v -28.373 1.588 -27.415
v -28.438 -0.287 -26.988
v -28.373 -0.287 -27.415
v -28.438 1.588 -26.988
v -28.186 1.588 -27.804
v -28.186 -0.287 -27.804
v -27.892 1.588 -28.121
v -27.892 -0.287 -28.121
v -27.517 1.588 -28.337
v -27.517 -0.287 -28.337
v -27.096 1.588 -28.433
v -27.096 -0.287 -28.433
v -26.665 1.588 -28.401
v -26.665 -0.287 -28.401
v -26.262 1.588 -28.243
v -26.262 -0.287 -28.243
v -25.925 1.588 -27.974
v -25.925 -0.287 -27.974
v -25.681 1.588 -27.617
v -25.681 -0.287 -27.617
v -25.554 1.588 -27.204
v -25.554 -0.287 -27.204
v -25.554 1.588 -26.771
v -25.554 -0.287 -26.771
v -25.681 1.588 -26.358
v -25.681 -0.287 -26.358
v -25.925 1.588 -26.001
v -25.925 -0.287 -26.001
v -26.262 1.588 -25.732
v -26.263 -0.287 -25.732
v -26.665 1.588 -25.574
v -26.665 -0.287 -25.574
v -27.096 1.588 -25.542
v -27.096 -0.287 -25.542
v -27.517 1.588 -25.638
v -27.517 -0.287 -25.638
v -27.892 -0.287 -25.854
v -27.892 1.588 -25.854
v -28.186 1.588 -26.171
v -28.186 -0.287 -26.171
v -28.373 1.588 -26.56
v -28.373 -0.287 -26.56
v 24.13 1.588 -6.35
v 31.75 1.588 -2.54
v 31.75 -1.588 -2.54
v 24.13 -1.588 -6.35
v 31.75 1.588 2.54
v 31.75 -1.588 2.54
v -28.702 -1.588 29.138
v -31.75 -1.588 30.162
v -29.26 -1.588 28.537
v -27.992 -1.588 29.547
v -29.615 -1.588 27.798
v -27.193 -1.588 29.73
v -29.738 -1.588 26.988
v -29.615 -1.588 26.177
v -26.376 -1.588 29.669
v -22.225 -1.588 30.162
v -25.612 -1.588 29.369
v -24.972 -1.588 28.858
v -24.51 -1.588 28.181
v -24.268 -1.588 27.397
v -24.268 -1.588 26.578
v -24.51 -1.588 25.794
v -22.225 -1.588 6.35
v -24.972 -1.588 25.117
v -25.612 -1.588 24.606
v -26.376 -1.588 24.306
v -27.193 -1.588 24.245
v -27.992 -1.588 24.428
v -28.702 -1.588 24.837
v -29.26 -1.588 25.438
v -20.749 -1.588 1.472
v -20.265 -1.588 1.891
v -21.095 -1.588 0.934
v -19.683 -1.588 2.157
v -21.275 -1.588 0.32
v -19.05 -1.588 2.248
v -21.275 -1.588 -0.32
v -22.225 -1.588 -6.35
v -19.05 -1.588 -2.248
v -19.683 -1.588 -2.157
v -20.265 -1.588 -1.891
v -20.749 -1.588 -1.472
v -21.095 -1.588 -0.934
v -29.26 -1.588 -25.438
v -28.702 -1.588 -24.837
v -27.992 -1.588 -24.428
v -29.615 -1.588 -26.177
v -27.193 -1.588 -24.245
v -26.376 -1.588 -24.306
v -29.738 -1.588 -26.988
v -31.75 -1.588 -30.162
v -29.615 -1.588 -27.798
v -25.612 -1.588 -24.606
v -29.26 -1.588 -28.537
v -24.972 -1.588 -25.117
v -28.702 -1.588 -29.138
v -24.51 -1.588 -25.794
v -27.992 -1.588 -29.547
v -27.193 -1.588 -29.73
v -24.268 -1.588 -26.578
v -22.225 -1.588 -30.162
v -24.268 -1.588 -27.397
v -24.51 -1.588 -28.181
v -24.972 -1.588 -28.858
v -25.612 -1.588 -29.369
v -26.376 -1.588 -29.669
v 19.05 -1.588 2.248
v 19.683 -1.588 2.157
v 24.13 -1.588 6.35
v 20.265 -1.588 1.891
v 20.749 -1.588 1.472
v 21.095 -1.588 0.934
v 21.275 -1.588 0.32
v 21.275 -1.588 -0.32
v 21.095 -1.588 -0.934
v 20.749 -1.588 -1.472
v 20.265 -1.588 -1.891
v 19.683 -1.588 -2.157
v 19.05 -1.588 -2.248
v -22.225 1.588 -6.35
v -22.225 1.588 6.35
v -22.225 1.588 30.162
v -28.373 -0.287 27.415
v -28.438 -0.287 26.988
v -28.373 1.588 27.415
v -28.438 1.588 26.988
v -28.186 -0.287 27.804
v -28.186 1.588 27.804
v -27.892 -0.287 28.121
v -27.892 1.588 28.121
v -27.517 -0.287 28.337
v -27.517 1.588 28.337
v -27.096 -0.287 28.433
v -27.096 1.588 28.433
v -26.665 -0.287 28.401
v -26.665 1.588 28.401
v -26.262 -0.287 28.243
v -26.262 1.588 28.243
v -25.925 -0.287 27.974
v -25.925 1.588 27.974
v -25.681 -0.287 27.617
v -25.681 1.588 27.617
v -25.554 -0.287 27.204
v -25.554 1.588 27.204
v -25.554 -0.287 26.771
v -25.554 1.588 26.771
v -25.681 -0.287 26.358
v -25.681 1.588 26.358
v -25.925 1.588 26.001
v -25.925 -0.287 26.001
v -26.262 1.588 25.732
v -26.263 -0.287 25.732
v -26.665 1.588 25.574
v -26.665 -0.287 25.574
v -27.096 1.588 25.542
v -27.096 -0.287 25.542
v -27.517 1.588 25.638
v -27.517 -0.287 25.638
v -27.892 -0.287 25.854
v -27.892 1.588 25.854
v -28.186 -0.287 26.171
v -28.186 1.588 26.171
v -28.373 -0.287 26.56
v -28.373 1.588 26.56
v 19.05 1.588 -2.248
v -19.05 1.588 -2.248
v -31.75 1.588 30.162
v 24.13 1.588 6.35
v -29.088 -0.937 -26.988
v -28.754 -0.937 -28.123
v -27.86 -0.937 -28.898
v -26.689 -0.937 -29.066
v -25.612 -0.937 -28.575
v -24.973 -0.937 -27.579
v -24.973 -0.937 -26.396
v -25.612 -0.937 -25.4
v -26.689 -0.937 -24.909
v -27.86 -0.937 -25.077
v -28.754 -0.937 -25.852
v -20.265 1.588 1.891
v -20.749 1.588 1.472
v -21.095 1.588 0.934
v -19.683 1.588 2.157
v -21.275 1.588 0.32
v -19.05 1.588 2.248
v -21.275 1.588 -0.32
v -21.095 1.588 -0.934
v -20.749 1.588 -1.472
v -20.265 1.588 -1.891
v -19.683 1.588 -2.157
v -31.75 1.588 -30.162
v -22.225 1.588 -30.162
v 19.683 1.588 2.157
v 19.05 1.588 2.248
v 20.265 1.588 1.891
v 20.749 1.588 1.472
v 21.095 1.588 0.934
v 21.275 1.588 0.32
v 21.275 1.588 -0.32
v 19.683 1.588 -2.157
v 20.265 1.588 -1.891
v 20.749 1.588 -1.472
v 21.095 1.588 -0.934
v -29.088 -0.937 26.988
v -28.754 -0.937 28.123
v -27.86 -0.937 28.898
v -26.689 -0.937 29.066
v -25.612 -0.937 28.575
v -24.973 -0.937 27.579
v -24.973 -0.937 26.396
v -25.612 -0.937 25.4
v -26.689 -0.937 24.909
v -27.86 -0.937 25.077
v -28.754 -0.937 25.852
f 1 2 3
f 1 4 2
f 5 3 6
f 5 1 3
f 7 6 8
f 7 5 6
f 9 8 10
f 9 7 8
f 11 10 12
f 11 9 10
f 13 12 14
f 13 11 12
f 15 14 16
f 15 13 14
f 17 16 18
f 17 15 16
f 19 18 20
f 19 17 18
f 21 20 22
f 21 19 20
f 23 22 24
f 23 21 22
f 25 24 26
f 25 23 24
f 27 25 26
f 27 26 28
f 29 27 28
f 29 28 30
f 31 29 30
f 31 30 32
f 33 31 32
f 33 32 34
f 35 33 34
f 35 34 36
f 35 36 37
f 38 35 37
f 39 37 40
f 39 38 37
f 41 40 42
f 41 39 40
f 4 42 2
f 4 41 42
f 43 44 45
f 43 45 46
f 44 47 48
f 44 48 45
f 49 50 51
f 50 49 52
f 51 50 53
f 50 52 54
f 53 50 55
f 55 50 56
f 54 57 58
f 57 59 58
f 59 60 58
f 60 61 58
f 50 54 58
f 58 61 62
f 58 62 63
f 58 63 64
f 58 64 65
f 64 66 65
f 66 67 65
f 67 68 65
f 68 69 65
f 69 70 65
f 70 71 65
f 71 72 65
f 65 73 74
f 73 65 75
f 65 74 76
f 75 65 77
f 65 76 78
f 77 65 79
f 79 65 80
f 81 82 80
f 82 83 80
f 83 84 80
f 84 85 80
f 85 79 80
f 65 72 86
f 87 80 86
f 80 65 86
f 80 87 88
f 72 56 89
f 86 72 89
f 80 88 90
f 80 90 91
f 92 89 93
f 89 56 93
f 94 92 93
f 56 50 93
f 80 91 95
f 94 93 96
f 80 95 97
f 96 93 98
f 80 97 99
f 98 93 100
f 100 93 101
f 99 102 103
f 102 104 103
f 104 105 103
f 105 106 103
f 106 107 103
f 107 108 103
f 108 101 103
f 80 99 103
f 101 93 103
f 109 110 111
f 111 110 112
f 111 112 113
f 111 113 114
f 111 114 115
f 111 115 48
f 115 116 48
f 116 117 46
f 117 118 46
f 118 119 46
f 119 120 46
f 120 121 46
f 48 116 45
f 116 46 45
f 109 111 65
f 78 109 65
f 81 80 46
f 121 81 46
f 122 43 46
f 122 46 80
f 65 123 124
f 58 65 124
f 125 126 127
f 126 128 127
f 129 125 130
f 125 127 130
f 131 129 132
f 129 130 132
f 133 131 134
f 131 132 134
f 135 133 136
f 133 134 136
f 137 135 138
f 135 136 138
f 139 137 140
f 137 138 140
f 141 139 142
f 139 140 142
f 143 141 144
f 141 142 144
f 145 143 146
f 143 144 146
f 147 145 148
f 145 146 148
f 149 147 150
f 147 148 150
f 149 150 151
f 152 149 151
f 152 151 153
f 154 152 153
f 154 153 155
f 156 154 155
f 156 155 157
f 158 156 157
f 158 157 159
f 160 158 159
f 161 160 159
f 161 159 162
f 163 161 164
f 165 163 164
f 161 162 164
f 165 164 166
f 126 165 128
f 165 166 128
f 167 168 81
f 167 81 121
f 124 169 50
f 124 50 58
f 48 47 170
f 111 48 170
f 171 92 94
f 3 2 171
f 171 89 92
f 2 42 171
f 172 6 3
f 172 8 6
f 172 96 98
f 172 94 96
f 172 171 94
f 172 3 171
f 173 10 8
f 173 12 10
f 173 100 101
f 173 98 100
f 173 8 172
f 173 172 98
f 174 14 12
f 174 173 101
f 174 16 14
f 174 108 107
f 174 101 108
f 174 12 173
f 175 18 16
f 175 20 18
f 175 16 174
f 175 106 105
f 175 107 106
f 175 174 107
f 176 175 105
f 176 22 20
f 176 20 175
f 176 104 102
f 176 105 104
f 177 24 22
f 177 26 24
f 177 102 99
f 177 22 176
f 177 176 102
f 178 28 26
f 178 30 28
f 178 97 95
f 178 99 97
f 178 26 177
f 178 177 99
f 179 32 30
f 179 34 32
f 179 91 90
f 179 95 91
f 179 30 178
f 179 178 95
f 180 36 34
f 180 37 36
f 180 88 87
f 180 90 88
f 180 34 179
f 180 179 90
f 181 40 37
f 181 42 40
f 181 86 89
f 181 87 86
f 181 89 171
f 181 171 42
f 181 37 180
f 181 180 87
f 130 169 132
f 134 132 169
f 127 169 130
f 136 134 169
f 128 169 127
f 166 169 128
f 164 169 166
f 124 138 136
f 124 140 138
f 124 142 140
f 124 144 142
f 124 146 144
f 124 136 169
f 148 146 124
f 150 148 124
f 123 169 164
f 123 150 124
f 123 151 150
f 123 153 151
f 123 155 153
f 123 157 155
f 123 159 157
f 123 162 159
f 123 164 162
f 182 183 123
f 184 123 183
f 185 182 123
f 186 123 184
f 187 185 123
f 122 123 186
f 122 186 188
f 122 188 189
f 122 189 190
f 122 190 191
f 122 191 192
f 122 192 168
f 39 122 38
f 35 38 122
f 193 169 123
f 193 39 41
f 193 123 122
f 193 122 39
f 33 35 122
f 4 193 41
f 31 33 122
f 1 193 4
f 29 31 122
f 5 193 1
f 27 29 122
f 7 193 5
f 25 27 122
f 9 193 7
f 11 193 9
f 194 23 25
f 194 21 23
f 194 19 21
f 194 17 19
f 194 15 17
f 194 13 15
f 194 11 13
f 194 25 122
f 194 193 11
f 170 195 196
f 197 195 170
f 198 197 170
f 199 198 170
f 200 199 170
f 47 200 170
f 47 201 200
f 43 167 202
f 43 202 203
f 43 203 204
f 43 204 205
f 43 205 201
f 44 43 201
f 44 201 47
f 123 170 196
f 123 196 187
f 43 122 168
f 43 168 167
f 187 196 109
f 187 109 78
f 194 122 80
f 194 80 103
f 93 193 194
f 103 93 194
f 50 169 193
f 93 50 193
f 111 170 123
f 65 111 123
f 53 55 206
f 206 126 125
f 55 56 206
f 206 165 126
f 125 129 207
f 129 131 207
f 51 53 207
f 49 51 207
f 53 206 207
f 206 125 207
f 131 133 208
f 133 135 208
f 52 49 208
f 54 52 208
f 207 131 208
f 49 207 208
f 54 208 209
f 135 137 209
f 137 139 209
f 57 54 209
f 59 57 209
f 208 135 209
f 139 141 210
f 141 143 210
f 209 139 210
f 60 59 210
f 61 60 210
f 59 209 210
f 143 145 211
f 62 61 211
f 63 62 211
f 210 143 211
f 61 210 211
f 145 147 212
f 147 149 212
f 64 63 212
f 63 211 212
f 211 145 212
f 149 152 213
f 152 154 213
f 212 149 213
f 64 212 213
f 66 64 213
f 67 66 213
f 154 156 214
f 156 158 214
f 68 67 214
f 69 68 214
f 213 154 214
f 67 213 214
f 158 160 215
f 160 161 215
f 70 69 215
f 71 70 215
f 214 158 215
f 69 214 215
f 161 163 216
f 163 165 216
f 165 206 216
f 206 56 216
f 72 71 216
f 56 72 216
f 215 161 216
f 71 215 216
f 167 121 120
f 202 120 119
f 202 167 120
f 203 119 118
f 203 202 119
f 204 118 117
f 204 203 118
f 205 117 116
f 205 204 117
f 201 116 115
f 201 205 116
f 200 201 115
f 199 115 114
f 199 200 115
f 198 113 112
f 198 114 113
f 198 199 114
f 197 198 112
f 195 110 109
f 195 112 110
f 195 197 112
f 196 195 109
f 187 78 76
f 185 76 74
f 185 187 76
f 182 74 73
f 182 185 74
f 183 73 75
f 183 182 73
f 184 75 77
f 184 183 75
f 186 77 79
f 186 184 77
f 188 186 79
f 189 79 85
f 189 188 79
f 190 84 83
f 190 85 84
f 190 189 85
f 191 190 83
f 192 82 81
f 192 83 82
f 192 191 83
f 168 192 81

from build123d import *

# Parameters (mm, degrees)
SKETCH2_W                                         = 63.5
SKETCH2_H                                         = 60.325
BOSS_EXTRUDE1_DEPTH                               = 1.5875
CUT_EXTRUDE1_REACH                                = 45.908
CUT_EXTRUDE2_REACH                                = 45.908
CSK_FOR_M2_5_FLAT_HEAD_MACHINE_SCREW1_D           = 2.9
CSK_FOR_M2_5_FLAT_HEAD_MACHINE_SCREW1_CSINK_D     = 5.5
CSK_FOR_M2_5_FLAT_HEAD_MACHINE_SCREW1_CSINK_ANGLE = 90


with BuildPart() as part:
    # Sketch2 → Boss-Extrude1 (new, symmetric)
    with BuildSketch(Plane(origin=(0, 0, 0), x_dir=(1, 0, 0), z_dir=(0, 1, 0))):
        Rectangle(SKETCH2_W, SKETCH2_H)
    extrude(amount=BOSS_EXTRUDE1_DEPTH, both=True)

    # Sketch4 → Cut-Extrude1 (cut, up to next)
    with BuildSketch(Plane(origin=(0, 1.5875, 0), x_dir=(1, 0, 0), z_dir=(0, 1, 0)), mode=Mode.PRIVATE) as cut_extrude1_sk1:
        Polygon((-22.225, -30.1625), (31.75, -30.1625), (31.75, -2.54), (24.13, -6.35), (-22.225, -6.35), align=None)
    cut_extrude1_tool1 = extrude(cut_extrude1_sk1.sketch, amount=-CUT_EXTRUDE1_REACH, mode=Mode.PRIVATE) & part.part
    # Sketch4 → Cut-Extrude1 (cut, up to next)
    with BuildSketch(Plane(origin=(0, 1.5875, 0), x_dir=(1, 0, 0), z_dir=(0, 1, 0)), mode=Mode.PRIVATE) as cut_extrude1_sk2:
        Polygon((31.75, 2.54), (24.13, 6.35), (-22.225, 6.35), (-22.225, 30.1625), (31.75, 30.1625), align=None)
    cut_extrude1_tool2 = extrude(cut_extrude1_sk2.sketch, amount=-CUT_EXTRUDE1_REACH, mode=Mode.PRIVATE) & part.part
    add(cut_extrude1_tool1.solids().sort_by_distance((5.035529, 1.5875, 18.109098))[0], mode=Mode.SUBTRACT)
    add(cut_extrude1_tool2.solids().sort_by_distance((5.035529, 1.5875, -18.109098))[0], mode=Mode.SUBTRACT)

    # Sketch5 → Cut-Extrude2 (cut, up to next)
    with BuildSketch(Plane(origin=(0, 1.5875, 0), x_dir=(1, 0, 0), z_dir=(0, 1, 0)), mode=Mode.PRIVATE) as cut_extrude2_sk1:
        with BuildLine():
            Line((-19.05, 2.2479), (19.05, 2.2479))
            ThreePointArc((19.05, 2.2479), (21.2979, 0), (19.05, -2.2479))
            Line((19.05, -2.2479), (-19.05, -2.2479))
            ThreePointArc((-19.05, -2.2479), (-21.2979, 0), (-19.05, 2.2479))
        make_face()
    cut_extrude2_tool1 = extrude(cut_extrude2_sk1.sketch, amount=-CUT_EXTRUDE2_REACH, mode=Mode.PRIVATE) & part.part
    add(cut_extrude2_tool1.solids().sort_by_distance((0, 1.5875, 0))[0], mode=Mode.SUBTRACT)

    # CSK for M2.5 Flat Head Machine Screw1 (through all)
    with Locations(Plane.XZ.offset(1.5875)):
        with Locations((-26.9875, 26.9875)):
            csk_for_m2_5_flat_head_machine_screw1 = CounterSinkHole(CSK_FOR_M2_5_FLAT_HEAD_MACHINE_SCREW1_D / 2, CSK_FOR_M2_5_FLAT_HEAD_MACHINE_SCREW1_CSINK_D / 2, counter_sink_angle=CSK_FOR_M2_5_FLAT_HEAD_MACHINE_SCREW1_CSINK_ANGLE)

    # Mirror1: CSK for M2.5 Flat Head Machine Screw1 across plane
    add(csk_for_m2_5_flat_head_machine_screw1.mirror(Plane.XY), mode=Mode.SUBTRACT)


solid = part.part
